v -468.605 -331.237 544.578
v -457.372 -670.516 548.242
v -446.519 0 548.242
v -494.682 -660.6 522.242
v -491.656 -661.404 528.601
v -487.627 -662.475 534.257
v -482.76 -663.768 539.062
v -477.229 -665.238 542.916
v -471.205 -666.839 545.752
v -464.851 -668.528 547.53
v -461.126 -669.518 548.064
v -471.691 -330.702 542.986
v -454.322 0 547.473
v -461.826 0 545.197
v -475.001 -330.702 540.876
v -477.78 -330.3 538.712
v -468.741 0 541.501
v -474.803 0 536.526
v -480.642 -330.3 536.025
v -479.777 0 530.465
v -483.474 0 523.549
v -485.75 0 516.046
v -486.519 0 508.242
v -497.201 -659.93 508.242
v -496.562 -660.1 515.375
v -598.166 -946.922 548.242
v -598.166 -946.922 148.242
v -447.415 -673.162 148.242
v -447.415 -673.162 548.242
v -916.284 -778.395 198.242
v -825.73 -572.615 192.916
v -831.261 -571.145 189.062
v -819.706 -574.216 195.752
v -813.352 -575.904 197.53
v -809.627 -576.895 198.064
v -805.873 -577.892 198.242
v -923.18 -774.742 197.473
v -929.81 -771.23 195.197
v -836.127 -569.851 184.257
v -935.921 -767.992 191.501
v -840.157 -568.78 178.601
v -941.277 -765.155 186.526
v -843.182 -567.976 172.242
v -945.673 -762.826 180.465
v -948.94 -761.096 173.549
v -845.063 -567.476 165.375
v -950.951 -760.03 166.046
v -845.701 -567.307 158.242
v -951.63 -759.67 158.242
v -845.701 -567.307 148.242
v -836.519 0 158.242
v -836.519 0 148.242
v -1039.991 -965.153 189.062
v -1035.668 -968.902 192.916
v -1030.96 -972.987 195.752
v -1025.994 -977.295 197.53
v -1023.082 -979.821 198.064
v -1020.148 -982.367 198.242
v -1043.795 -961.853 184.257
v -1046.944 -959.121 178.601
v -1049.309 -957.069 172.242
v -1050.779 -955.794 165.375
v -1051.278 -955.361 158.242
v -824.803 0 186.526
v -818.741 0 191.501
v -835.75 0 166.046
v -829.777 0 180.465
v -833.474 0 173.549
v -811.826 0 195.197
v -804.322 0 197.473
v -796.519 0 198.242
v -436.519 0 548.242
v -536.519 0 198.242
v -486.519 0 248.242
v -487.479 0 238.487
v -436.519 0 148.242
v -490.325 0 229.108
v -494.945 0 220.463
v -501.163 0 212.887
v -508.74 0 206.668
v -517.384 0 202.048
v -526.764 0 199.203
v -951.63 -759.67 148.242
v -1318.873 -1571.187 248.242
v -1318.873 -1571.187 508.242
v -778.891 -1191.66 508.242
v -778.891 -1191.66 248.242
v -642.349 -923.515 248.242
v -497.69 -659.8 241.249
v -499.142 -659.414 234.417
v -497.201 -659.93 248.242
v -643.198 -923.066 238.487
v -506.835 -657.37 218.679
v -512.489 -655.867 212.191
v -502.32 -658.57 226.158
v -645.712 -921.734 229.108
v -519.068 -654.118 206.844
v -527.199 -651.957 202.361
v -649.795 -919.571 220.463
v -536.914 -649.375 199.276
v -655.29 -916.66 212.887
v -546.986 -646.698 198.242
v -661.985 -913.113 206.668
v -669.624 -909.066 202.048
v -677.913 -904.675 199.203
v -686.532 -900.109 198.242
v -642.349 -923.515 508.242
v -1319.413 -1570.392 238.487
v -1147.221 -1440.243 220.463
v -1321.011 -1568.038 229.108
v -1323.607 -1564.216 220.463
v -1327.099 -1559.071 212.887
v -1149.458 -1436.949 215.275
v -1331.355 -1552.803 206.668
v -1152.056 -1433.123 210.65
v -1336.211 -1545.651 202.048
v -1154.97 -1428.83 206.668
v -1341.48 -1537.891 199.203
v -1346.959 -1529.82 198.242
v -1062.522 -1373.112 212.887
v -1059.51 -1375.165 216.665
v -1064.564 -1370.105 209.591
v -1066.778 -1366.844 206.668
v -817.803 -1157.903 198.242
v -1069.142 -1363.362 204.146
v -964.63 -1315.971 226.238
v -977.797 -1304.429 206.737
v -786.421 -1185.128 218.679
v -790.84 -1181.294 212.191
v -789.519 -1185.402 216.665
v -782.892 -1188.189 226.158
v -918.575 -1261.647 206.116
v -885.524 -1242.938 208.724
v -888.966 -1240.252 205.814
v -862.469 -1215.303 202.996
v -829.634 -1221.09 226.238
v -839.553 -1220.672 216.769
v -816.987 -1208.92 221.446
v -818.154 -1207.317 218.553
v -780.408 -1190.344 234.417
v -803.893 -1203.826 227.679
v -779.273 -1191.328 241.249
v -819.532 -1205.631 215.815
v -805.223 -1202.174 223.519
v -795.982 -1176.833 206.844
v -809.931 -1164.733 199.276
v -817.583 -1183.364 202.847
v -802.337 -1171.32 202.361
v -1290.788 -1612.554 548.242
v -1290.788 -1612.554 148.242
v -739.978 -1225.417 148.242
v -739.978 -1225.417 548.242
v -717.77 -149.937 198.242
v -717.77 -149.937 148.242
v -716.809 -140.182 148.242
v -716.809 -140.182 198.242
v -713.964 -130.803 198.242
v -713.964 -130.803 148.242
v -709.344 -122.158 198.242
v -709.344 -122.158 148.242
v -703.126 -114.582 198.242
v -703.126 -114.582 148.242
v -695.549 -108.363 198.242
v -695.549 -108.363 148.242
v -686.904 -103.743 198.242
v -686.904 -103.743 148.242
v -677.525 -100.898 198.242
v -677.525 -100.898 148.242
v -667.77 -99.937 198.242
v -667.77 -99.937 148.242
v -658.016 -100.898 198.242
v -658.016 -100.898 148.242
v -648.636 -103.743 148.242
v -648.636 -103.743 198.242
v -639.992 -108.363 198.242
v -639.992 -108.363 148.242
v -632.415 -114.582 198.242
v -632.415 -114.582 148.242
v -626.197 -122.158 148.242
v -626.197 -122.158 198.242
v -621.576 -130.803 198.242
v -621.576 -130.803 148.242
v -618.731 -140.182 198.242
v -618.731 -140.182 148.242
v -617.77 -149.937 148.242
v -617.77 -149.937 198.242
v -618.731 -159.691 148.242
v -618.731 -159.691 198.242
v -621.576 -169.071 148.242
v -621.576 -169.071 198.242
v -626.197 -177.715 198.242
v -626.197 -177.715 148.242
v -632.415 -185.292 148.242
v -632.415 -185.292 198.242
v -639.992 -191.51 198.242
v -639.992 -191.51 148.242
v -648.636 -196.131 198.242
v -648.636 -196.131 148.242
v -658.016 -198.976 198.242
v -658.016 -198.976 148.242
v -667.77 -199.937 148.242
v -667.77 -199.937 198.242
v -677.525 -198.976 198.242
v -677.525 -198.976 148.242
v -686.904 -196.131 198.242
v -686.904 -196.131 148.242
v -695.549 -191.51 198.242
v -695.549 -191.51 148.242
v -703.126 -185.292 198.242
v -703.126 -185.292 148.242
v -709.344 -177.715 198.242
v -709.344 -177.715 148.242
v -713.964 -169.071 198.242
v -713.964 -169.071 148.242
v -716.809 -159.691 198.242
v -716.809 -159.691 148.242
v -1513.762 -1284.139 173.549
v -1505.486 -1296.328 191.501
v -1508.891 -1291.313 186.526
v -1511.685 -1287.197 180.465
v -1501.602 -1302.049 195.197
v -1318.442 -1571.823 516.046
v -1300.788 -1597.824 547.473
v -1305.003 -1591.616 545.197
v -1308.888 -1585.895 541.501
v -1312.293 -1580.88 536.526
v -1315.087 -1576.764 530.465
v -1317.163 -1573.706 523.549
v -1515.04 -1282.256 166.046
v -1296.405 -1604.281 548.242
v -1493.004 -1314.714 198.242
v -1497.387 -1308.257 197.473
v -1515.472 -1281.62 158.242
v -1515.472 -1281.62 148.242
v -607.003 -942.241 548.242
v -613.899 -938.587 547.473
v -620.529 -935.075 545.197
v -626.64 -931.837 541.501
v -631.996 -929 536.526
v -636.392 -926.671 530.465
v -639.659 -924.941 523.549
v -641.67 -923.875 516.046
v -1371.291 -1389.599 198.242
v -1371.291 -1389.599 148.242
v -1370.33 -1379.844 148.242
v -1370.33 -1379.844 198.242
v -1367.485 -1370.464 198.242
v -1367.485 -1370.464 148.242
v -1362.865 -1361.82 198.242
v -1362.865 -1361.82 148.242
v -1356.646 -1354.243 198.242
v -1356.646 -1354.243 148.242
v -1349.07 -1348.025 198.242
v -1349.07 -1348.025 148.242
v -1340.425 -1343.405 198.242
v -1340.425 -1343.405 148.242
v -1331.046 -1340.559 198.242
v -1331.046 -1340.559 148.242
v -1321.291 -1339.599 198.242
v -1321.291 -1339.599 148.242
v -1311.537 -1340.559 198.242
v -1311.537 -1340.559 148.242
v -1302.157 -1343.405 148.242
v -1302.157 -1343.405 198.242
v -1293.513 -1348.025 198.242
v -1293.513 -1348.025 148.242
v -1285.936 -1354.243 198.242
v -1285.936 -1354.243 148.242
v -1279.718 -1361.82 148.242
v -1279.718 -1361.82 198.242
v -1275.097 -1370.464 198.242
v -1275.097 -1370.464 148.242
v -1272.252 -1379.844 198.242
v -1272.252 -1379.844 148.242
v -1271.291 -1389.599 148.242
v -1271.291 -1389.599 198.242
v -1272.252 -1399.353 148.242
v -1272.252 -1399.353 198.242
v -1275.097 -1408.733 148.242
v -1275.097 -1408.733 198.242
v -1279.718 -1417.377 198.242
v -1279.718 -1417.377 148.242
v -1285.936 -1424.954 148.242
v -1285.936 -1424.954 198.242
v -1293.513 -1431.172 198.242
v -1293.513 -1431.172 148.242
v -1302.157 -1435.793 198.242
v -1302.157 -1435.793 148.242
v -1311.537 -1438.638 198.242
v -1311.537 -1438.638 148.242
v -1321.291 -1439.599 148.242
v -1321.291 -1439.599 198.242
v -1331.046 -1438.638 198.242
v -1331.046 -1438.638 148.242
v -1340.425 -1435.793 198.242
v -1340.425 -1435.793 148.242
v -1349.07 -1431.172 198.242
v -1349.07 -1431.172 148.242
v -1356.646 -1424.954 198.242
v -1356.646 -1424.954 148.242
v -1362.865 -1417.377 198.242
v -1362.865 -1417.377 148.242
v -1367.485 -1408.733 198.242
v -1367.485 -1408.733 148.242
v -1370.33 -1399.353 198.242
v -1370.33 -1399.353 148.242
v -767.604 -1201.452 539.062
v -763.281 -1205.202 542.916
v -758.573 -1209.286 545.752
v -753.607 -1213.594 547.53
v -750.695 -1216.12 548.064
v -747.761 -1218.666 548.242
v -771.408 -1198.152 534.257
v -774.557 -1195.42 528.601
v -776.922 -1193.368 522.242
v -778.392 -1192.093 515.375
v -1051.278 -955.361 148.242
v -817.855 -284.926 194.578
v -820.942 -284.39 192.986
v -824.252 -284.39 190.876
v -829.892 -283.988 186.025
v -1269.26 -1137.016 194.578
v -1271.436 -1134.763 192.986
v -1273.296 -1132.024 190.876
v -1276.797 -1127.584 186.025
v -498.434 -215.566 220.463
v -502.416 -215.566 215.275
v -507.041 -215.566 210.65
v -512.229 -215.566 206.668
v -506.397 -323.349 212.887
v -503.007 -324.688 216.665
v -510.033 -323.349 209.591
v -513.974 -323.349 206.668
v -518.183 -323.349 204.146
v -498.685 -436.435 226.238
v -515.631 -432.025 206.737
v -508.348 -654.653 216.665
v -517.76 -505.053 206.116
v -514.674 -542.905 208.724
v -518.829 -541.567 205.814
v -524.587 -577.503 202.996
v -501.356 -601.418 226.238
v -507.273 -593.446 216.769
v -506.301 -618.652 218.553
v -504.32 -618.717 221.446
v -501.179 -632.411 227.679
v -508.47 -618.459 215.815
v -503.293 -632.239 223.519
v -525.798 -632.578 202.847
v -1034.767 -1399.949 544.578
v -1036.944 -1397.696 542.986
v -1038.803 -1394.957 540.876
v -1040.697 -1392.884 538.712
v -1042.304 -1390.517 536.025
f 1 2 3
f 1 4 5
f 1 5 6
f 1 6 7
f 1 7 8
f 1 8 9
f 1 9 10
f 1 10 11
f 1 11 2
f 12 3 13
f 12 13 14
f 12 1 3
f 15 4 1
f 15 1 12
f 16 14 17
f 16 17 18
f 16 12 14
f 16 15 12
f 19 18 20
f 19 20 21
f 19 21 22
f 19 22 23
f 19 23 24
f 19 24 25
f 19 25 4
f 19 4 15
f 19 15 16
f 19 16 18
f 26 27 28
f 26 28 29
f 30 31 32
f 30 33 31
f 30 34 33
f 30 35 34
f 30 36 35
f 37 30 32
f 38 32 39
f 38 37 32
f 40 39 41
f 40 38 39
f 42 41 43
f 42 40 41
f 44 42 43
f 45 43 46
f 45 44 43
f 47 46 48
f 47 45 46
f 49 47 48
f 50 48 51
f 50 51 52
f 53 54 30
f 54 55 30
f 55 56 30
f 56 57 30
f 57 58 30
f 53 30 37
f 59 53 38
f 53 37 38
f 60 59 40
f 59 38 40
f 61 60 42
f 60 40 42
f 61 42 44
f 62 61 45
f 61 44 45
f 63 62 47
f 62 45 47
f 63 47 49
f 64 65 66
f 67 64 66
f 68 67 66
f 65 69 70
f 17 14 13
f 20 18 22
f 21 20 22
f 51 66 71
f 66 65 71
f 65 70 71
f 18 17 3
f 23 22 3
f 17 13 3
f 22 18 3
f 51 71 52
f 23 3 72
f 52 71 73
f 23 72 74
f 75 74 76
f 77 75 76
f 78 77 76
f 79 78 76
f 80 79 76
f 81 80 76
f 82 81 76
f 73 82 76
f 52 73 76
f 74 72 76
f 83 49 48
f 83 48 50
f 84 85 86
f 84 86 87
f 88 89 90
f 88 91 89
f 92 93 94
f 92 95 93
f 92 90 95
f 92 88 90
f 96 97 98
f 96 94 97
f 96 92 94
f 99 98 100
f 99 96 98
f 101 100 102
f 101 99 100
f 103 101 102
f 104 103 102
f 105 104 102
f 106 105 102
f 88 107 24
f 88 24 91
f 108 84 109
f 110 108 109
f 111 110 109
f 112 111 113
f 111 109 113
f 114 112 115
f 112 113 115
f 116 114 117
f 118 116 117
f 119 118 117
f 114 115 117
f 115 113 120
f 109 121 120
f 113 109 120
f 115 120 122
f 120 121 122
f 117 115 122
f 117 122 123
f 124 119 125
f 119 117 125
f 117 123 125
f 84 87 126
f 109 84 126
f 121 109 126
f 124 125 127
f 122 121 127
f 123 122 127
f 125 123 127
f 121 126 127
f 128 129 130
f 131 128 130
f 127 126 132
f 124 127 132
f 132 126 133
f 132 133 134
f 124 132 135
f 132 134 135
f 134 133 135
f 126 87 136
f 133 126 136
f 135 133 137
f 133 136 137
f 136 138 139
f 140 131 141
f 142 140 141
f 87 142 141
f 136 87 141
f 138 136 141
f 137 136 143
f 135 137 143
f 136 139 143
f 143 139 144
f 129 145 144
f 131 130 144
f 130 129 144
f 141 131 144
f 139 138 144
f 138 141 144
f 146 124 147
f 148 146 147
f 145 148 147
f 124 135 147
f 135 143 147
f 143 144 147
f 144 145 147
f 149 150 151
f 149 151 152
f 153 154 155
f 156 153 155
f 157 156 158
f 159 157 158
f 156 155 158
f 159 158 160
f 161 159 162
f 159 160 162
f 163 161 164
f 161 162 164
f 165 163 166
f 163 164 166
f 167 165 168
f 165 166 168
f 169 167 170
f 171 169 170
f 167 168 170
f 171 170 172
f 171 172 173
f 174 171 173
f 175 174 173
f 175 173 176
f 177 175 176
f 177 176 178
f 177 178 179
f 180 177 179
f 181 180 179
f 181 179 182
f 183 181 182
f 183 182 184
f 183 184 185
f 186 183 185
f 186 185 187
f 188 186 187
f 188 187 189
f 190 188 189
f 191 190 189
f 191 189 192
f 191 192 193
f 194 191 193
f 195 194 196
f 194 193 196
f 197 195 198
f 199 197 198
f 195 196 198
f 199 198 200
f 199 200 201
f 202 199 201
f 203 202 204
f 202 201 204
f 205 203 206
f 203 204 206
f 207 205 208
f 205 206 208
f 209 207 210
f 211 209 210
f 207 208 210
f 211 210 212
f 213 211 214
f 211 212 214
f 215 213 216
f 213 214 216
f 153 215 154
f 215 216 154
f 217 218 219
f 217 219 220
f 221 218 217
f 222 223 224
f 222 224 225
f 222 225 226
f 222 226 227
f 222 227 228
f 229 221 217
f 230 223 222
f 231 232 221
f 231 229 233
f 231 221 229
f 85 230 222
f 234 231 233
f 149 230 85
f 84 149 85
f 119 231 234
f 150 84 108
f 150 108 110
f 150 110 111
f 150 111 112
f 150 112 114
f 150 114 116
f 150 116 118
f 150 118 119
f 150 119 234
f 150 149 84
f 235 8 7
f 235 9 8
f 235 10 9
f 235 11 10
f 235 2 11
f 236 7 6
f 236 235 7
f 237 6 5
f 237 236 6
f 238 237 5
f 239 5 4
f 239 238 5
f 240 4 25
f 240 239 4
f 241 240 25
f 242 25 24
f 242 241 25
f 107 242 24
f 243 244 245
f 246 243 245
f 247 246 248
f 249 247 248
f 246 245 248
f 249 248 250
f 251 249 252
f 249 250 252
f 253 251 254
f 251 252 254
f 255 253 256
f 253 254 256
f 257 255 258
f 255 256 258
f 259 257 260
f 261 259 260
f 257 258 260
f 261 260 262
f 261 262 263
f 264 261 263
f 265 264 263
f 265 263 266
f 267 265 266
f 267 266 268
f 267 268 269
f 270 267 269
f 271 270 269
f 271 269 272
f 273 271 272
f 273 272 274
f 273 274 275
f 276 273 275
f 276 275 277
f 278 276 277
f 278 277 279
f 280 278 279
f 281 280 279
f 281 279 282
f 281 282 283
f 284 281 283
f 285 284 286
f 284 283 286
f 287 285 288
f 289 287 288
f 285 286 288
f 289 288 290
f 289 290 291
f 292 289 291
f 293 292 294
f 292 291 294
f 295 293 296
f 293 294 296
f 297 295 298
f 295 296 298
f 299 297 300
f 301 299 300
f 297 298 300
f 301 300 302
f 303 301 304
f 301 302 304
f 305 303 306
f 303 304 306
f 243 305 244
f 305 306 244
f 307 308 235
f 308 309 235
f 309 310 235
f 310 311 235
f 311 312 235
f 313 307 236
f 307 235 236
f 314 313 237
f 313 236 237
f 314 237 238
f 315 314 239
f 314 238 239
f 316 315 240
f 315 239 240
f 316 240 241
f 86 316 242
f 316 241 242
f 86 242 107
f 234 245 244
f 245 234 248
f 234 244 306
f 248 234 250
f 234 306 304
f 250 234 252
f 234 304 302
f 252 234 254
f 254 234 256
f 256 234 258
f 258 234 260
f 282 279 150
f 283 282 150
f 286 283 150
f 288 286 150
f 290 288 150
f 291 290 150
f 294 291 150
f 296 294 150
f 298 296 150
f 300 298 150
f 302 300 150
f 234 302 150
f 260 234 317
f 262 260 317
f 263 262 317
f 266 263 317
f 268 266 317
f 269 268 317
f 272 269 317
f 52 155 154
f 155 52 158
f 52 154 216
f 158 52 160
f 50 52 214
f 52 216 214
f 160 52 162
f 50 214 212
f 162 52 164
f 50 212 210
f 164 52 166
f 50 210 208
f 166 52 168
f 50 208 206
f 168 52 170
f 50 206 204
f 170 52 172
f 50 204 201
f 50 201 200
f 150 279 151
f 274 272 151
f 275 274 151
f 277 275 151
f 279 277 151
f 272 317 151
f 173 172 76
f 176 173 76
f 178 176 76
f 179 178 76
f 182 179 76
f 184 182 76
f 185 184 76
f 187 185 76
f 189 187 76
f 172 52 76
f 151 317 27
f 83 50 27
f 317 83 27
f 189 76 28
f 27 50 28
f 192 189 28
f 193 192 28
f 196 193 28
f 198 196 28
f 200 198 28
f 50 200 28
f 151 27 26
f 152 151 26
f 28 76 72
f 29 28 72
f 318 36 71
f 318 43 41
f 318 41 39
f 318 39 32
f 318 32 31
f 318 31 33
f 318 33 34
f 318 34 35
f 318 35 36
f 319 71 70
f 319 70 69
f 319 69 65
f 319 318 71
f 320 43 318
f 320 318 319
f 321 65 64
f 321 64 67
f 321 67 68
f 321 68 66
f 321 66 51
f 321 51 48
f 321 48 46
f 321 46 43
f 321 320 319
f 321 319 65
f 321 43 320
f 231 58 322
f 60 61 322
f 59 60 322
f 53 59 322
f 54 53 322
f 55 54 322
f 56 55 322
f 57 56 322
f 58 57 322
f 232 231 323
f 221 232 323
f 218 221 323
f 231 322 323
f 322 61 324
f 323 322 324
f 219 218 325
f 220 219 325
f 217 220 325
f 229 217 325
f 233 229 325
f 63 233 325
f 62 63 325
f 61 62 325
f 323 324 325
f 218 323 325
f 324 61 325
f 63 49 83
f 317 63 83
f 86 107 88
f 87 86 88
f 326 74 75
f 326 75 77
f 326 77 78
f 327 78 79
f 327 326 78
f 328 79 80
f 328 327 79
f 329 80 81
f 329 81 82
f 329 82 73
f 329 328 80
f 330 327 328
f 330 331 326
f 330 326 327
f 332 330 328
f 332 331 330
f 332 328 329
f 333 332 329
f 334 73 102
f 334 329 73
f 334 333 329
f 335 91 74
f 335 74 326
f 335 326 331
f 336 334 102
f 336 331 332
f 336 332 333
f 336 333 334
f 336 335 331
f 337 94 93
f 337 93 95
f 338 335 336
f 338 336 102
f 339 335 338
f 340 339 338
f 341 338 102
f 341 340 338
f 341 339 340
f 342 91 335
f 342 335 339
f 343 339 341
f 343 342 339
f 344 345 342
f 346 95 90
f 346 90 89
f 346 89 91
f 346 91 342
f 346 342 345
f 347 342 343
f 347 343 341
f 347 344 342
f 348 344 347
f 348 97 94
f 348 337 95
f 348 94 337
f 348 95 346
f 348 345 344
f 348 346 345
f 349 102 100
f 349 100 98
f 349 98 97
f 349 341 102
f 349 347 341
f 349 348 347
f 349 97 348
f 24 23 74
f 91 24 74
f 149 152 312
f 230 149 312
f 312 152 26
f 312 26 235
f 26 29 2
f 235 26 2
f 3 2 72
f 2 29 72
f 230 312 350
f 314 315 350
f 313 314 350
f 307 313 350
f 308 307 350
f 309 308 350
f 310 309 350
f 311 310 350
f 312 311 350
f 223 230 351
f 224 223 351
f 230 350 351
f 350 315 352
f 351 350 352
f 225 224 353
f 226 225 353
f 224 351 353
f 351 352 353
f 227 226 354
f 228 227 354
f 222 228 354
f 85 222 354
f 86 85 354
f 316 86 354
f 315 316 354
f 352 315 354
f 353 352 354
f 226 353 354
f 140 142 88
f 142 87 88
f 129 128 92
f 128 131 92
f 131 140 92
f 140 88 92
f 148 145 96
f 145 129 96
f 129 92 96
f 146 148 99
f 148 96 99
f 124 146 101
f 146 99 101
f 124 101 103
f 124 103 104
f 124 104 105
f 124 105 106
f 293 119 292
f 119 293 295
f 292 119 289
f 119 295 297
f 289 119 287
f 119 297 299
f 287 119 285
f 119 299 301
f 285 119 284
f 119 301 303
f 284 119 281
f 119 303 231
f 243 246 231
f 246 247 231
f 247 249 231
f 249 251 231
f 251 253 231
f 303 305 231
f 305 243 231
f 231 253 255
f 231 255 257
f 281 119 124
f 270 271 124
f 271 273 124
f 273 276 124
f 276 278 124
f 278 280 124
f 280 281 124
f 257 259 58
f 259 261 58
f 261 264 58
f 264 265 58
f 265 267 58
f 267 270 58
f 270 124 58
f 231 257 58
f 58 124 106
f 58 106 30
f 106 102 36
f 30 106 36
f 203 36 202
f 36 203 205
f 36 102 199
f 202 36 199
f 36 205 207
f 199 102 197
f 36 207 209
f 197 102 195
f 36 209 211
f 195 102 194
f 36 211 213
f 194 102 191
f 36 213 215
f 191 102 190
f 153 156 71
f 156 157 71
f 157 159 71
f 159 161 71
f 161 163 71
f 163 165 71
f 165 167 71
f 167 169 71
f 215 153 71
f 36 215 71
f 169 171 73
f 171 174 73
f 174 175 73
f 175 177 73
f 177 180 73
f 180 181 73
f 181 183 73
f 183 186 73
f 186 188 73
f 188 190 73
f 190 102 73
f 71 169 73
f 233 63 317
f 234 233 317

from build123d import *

# Parameters (mm, degrees)
F5_D = 100
F7_D = 100


# Not quite as in the source:
# - a feature names something its author has since deleted; it is built from what else it names


with BuildPart() as f2:
    # F2: sweep along a path in F1
    with BuildLine(Plane.XY) as f2_path:
        Line((-107.3189526796, -226.6205847263), (-115.9728169441, -761.2517476082))
        Line((-115.9728169441, -761.2517476082), (-413.3533239365, -1301.2853860855))
    # F0 (on Front) → F2 (sweep)
    with BuildSketch(Plane.XZ):
        with BuildLine():
            Line((-836.5186393261, 158.2419019938), (-836.5186393261, 148.2419019938))
            Line((-836.5186393261, 148.2419019938), (-436.5186393261, 148.2419019938))
            Line((-436.5186393261, 148.2419019938), (-436.5186393261, 548.2419019938))
            Line((-436.5186393261, 548.2419019938), (-446.5186393261, 548.2419019938))
            ThreePointArc((-446.5186393261, 548.2419019938), (-474.8029105736, 536.5261732412), (-486.5186393261, 508.2419019938))
            Line((-486.5186393261, 508.2419019938), (-486.5186393261, 248.2419019938))
            ThreePointArc((-486.5186393261, 248.2419019938), (-501.1633002668, 212.8865629344), (-536.5186393261, 198.2419019938))
            Line((-536.5186393261, 198.2419019938), (-796.5186393261, 198.2419019938))
            ThreePointArc((-796.5186393261, 198.2419019938), (-824.8029105736, 186.5261732412), (-836.5186393261, 158.2419019938))
        make_face()
    sweep(path=f2_path.line, transition=Transition.RIGHT)

    # F3: F2 across face


with BuildPart() as f2_1:
    add(f2.part)
    add(f2.part.mirror(Plane(origin=(-700.4191524375, -892.7521403639, 263.9571660189), x_dir=(0.8836600113, -0.4681292389, 0), z_dir=(-0.4681292389, -0.8836600113, 0))))

    # F5 (through all)
    with Locations(Plane.XY.offset(198.2419019938)):
        with Locations((-667.7702069283, -149.9368995428)):
            Hole(F5_D / 2)

    # F7 (through all)
    with Locations(Plane.XY.offset(198.2419019938)):
        with Locations((-1321.2910347152, -1389.5985503476)):
            Hole(F7_D / 2)


solid = f2_1.part
